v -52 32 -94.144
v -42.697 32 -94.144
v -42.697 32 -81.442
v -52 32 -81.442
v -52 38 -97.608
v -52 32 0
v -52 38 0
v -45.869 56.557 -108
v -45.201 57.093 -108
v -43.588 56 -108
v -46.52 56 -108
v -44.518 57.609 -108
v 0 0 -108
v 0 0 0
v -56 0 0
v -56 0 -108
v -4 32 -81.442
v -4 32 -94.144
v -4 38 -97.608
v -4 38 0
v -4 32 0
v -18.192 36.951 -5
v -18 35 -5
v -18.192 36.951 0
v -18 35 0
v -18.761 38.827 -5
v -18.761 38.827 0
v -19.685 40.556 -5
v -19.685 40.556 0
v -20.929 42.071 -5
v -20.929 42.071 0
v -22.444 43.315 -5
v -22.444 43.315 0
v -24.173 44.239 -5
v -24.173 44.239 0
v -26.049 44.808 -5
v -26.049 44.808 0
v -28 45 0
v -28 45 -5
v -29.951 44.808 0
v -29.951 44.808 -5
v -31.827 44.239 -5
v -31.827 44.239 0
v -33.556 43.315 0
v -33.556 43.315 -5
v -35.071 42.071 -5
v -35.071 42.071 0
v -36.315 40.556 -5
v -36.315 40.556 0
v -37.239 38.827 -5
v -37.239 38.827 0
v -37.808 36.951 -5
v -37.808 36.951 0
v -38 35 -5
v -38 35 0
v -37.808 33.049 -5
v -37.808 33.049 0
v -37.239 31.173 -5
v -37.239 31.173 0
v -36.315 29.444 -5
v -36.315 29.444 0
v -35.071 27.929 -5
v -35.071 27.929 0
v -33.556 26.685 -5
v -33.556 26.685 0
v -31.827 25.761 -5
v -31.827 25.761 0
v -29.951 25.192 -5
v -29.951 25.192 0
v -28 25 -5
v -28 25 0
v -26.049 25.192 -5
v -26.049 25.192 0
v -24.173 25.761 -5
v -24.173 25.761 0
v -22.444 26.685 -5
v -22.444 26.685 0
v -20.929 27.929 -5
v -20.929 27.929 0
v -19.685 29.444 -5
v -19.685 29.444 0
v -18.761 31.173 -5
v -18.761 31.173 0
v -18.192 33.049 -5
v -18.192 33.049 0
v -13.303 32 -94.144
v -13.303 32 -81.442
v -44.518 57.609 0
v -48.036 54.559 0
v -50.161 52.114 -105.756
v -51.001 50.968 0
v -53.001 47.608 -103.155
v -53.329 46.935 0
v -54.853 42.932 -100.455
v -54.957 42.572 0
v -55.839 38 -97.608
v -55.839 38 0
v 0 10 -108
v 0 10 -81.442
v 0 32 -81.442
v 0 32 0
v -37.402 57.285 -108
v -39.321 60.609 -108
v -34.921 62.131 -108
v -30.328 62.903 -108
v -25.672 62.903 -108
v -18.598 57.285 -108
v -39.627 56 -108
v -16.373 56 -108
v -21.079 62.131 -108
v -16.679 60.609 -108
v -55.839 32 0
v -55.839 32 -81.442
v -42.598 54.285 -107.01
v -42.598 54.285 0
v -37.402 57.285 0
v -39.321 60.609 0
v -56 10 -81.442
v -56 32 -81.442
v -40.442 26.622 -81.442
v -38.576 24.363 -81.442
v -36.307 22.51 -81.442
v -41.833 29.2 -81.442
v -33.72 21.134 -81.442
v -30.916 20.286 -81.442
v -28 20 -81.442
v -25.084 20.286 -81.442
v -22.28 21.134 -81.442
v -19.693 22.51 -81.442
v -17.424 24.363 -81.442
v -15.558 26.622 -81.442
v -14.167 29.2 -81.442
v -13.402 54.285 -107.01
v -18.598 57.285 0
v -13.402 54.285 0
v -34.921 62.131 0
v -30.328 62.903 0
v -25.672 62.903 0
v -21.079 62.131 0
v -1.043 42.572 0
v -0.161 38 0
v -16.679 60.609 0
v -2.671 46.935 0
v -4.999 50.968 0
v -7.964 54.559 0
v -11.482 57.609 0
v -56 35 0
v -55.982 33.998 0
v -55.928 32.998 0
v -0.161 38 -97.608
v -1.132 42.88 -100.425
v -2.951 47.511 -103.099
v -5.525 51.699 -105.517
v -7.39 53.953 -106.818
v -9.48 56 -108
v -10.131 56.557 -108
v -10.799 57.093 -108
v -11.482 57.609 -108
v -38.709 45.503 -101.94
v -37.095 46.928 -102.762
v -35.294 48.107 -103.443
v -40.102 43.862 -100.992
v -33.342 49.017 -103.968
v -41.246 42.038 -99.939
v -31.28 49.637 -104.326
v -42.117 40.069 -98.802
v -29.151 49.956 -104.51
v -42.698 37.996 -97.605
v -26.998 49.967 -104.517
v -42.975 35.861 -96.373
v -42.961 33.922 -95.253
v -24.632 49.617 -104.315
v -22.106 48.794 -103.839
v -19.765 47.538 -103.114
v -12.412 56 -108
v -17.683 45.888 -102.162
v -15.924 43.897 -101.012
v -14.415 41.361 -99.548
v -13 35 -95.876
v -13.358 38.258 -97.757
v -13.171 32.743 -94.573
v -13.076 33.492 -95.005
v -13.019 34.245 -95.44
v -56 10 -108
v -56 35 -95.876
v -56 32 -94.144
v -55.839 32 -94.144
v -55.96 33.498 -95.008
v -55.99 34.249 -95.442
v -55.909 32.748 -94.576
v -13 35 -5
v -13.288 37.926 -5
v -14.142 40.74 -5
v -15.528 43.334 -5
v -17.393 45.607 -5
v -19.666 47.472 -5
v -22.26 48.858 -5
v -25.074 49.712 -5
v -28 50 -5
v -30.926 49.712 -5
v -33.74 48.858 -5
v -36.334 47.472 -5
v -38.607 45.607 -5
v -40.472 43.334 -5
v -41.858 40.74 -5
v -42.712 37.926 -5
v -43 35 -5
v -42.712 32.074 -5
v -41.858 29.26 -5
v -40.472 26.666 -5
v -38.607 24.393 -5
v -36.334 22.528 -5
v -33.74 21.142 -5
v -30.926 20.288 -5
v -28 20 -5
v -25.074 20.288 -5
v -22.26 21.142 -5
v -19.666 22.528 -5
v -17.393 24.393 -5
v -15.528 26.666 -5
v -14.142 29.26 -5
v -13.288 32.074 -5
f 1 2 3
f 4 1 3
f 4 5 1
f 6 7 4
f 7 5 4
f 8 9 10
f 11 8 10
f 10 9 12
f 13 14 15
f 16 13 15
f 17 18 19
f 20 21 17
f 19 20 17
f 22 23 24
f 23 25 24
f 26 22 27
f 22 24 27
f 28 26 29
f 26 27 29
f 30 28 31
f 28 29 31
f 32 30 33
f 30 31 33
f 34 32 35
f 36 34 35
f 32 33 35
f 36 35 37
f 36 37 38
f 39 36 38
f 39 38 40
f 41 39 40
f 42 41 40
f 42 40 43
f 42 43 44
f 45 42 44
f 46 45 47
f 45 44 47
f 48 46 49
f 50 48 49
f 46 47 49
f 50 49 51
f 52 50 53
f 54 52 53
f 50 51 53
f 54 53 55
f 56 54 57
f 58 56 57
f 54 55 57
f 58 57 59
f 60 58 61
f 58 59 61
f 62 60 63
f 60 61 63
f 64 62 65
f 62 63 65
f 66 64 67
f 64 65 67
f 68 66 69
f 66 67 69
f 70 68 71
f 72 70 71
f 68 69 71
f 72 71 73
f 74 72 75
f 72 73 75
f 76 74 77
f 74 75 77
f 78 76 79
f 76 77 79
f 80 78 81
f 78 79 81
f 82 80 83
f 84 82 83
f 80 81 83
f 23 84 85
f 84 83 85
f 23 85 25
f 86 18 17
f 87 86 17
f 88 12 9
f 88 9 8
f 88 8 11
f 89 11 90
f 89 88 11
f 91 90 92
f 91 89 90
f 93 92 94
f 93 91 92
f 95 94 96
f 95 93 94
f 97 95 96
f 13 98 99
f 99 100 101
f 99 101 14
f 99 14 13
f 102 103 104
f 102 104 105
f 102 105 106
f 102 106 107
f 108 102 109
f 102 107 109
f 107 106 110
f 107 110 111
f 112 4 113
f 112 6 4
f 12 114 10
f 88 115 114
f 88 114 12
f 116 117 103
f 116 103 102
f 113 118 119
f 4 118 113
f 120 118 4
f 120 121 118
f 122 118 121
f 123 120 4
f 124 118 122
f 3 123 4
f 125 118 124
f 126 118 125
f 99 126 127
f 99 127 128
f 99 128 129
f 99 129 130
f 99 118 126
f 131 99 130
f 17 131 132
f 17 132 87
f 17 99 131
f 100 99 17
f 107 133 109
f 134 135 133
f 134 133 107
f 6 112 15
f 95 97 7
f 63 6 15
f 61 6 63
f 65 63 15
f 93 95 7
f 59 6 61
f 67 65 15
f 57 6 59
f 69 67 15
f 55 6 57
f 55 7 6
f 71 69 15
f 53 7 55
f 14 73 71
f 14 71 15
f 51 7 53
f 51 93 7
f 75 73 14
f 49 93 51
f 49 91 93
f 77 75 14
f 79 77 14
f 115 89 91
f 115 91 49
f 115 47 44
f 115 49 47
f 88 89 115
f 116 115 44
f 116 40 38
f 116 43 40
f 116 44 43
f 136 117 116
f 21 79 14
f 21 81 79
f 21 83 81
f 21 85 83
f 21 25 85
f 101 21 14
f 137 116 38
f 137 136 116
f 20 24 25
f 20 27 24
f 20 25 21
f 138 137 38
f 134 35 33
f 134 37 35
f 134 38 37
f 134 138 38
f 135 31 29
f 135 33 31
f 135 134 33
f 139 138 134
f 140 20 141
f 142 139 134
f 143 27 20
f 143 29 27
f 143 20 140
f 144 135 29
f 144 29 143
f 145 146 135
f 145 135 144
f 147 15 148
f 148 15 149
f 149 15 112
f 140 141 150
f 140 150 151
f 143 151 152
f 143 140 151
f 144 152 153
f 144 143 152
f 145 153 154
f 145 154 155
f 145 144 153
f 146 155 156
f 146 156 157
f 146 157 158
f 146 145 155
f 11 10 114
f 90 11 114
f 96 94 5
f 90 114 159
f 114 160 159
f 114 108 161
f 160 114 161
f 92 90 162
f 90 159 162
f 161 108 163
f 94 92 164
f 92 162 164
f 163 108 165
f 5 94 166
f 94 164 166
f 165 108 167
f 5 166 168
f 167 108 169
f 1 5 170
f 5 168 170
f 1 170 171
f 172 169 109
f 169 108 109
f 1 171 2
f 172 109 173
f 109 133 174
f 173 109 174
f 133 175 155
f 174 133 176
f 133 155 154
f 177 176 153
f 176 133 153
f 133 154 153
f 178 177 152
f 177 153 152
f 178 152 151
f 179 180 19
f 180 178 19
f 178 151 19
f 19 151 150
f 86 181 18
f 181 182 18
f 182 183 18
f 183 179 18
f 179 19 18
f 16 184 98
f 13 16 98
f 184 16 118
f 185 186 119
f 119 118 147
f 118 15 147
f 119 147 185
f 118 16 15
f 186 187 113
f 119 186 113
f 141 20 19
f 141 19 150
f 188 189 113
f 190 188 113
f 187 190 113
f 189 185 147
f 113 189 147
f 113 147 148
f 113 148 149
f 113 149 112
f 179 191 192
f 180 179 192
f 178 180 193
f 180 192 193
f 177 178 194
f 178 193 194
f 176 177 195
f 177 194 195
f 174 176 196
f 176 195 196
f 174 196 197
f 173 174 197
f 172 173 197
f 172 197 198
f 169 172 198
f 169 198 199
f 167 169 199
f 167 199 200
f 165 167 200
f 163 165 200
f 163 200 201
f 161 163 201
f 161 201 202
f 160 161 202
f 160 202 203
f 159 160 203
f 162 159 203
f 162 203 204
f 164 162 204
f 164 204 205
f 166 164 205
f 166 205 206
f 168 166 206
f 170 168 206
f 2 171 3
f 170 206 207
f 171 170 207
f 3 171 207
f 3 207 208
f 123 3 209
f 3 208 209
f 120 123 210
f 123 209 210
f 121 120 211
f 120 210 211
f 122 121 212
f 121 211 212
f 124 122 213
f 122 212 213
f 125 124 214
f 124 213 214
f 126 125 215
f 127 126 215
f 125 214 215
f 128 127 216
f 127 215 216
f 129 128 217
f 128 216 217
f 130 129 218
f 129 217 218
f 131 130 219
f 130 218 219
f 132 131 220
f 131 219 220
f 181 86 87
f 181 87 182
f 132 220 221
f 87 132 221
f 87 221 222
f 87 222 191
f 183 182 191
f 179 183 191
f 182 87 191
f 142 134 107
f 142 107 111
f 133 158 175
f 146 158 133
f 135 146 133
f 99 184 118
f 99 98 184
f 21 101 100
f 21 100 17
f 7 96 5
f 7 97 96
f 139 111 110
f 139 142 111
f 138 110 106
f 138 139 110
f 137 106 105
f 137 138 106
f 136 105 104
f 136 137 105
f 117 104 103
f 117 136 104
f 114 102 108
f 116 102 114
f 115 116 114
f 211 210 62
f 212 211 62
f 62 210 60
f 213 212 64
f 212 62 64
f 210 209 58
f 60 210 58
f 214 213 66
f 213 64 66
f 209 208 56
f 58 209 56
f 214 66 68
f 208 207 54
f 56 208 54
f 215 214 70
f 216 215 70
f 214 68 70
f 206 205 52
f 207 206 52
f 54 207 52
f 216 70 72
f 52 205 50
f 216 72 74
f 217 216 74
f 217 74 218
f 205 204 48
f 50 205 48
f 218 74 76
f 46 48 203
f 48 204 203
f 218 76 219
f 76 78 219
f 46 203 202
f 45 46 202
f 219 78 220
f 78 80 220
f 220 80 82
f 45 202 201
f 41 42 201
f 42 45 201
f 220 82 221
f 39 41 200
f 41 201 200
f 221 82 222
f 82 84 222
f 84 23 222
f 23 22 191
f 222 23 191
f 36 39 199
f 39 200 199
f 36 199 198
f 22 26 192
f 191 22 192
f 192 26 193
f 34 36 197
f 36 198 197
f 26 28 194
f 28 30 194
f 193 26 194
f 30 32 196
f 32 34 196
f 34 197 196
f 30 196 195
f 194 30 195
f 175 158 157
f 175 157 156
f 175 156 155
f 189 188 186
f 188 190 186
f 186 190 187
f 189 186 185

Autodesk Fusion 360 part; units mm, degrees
sketch "Sketch1" plane through (0, 0, 0) normal (0, 0, 1) x (1, 0, 0)
  line L0 (0, 0) -> (-56, 0)
  line L1 (-56, 0) -> (-56, 35)
  line L2 (0, 35) -> (0, 0)
  line L3 (-56, 0) -> (-28, 0)
  circle A0 centre (-28, 35) radius 10
  line L4 (-28, 0) -> (-4, 0)
  line L5 (-28, 35) -> (0, 35) construction
  line L6 (-28, 35) -> (-28, 0) construction
  line L7 (-4, 0) -> (-4, 35) construction
  line L8 (0, 35) -> (0, 32)
  line L9 (0, 32) -> (-4, 32)
  line L10 (-4, 32) -> (-4, 38)
  line L11 (-4, 38) -> (-0.1612, 38)
  line L12 (0, 35) -> (0, 32)
  line L13 (-28, 35) -> (-14, 59.2487) construction
  line L14 (-28, 35) -> (-42, 59.2487) construction
  line L15 (-28, 35) -> (-56, 35) construction
  line L16 (-18.5981, 57.2846) -> (-16.6787, 60.6091)
  line L17 (-11.4825, 57.6091) -> (-13.4019, 54.2846)
  line L18 (-13.4019, 54.2846) -> (-18.5981, 57.2846)
  line L19 (-42.5981, 54.2846) -> (-44.5175, 57.6091)
  line L20 (-39.3213, 60.6091) -> (-37.4019, 57.2846)
  line L21 (-37.4019, 57.2846) -> (-42.5981, 54.2846)
  line L22 (-52, 32) -> (-55.8388, 32)
  line L23 (-55.8388, 38) -> (-52, 38)
  line L24 (-52, 38) -> (-52, 32)
  line L25 (-44.5981, 12.2513) -> (-44.5175, 12.3909)
  arc A1 (-0.1612, 32) -> (-42, 59.2487) centre (-28, 35) ccw
  line L26 (-16.5981, 9.2513) -> (-16.6787, 9.3909)
  arc A2 (0, 35) -> (-11.4825, 57.6091) centre (-28, 35) ccw
  arc A3 (-14, 59.2487) -> (-56, 35) centre (-28, 35) ccw
  arc A4 (-56, 35) -> (-55.8388, 32) centre (-28, 35) ccw
  arc A5 (-42, 59.2487) -> (-55.8388, 32) centre (-28, 35) ccw
  arc A6 (-14, 59.2487) -> (-55.8388, 32) centre (-28, 35) ccw
  arc A7 (-0.1612, 32) -> (0, 35) centre (-28, 35) ccw
  arc A8 (-0.1612, 32) -> (-14, 59.2487) centre (-28, 35) ccw
  circle A9 centre (-28, 35) radius 15
  dimension "d1" = 56
  dimension "d2" = 35
  dimension "d3" = 20
  dimension "d4" = 24
  dimension "d5" = 3
  dimension "d7" = 60
  dimension "d8" = 60
  dimension "d13" = 30
extrude "Extrude1" add sketch "Sketch1" against normal blind 108 contours L0 L1 L2 L3 L4 L9 L10 L11 L16 L17 L18 L19 L20 L21 L22 L23 L24 A1 A2 A3 A4 A5 A6 A8
sketch "Sketch2" plane through (0, 0, 0) normal (1, 0, 0) x (0, 0, -1)
  line L0 (0, 32) -> (0, 0)
  line L1 (0, 0) -> (108, 0)
  line L2 (108, 0) -> (108, 32)
  line L3 (108, 32) -> (0, 32)
  line L4 (108, 0) -> (108, 56)
  line L5 (108, 56) -> (81.4419, 10)
  line L6 (108, 0) -> (108, 10)
  line L7 (108, 10) -> (81.4419, 10)
  dimension "d16" = 56
  dimension "d17" = 30
  dimension "d18" = 10
extrude "Extrude2" cut sketch "Sketch2" against normal blind 130 contours L3 L4 L5 | L2 L3 L4 L5 L7
sketch "Sketch3" plane through (0, 0, 0) normal (1, 0, 0) x (0, 0, -1)
  line L0 (81.4419, 10) -> (94.1436, 32)
  line L1 (94.1436, 32) -> (0, 32)
  line L2 (0, 32) -> (0, 0)
  line L3 (0, 0) -> (108, 0)
  line L4 (108, 0) -> (108, 10)
  line L5 (108, 10) -> (81.4419, 10)
  line L6 (81.4419, 10) -> (81.4419, 32)
  line L7 (81.4419, 32) -> (94.1436, 32)
  line L8 (94.1436, 32) -> (81.4419, 10)
extrude "Extrude3" cut sketch "Sketch3" against normal blind 140 contours L0 L1 L6 L7 L8
sketch "Sketch4" plane through (0, 0, 0) normal (0, 0, 1) x (1, 0, 0)
  circle A0 centre (-28, 35) radius 15
  line L0 (-56, 0) -> (0, 0)
  line L1 (0, 0) -> (0, 32)
  line L2 (0, 32) -> (-4, 32)
  line L3 (-4, 32) -> (-4, 38)
  line L4 (-4, 38) -> (-0.1612, 38)
  arc A1 (-0.1612, 38) -> (-11.4825, 57.6091) centre (-28, 35) ccw
  line L5 (-11.4825, 57.6091) -> (-13.4019, 54.2846)
  line L6 (-13.4019, 54.2846) -> (-18.5981, 57.2846)
  line L7 (-18.5981, 57.2846) -> (-16.6787, 60.6091)
  arc A2 (-16.6787, 60.6091) -> (-39.3213, 60.6091) centre (-28, 35) ccw
  line L8 (-39.3213, 60.6091) -> (-37.4019, 57.2846)
  line L9 (-37.4019, 57.2846) -> (-42.5981, 54.2846)
  line L10 (-42.5981, 54.2846) -> (-44.5175, 57.6091)
  arc A3 (-44.5175, 57.6091) -> (-55.8388, 38) centre (-28, 35) ccw
  line L11 (-55.8388, 38) -> (-52, 38)
  line L12 (-52, 38) -> (-52, 32)
  line L13 (-52, 32) -> (-55.8388, 32)
  arc A4 (-56, 35) -> (-55.8388, 32) centre (-28, 35) ccw
  line L14 (-56, 35) -> (-56, 0)
  circle A5 centre (-28, 35) radius 10
  dimension "d23" = 20
extrude "Extrude4" add sketch "Sketch4" against normal blind 5 contours A0
